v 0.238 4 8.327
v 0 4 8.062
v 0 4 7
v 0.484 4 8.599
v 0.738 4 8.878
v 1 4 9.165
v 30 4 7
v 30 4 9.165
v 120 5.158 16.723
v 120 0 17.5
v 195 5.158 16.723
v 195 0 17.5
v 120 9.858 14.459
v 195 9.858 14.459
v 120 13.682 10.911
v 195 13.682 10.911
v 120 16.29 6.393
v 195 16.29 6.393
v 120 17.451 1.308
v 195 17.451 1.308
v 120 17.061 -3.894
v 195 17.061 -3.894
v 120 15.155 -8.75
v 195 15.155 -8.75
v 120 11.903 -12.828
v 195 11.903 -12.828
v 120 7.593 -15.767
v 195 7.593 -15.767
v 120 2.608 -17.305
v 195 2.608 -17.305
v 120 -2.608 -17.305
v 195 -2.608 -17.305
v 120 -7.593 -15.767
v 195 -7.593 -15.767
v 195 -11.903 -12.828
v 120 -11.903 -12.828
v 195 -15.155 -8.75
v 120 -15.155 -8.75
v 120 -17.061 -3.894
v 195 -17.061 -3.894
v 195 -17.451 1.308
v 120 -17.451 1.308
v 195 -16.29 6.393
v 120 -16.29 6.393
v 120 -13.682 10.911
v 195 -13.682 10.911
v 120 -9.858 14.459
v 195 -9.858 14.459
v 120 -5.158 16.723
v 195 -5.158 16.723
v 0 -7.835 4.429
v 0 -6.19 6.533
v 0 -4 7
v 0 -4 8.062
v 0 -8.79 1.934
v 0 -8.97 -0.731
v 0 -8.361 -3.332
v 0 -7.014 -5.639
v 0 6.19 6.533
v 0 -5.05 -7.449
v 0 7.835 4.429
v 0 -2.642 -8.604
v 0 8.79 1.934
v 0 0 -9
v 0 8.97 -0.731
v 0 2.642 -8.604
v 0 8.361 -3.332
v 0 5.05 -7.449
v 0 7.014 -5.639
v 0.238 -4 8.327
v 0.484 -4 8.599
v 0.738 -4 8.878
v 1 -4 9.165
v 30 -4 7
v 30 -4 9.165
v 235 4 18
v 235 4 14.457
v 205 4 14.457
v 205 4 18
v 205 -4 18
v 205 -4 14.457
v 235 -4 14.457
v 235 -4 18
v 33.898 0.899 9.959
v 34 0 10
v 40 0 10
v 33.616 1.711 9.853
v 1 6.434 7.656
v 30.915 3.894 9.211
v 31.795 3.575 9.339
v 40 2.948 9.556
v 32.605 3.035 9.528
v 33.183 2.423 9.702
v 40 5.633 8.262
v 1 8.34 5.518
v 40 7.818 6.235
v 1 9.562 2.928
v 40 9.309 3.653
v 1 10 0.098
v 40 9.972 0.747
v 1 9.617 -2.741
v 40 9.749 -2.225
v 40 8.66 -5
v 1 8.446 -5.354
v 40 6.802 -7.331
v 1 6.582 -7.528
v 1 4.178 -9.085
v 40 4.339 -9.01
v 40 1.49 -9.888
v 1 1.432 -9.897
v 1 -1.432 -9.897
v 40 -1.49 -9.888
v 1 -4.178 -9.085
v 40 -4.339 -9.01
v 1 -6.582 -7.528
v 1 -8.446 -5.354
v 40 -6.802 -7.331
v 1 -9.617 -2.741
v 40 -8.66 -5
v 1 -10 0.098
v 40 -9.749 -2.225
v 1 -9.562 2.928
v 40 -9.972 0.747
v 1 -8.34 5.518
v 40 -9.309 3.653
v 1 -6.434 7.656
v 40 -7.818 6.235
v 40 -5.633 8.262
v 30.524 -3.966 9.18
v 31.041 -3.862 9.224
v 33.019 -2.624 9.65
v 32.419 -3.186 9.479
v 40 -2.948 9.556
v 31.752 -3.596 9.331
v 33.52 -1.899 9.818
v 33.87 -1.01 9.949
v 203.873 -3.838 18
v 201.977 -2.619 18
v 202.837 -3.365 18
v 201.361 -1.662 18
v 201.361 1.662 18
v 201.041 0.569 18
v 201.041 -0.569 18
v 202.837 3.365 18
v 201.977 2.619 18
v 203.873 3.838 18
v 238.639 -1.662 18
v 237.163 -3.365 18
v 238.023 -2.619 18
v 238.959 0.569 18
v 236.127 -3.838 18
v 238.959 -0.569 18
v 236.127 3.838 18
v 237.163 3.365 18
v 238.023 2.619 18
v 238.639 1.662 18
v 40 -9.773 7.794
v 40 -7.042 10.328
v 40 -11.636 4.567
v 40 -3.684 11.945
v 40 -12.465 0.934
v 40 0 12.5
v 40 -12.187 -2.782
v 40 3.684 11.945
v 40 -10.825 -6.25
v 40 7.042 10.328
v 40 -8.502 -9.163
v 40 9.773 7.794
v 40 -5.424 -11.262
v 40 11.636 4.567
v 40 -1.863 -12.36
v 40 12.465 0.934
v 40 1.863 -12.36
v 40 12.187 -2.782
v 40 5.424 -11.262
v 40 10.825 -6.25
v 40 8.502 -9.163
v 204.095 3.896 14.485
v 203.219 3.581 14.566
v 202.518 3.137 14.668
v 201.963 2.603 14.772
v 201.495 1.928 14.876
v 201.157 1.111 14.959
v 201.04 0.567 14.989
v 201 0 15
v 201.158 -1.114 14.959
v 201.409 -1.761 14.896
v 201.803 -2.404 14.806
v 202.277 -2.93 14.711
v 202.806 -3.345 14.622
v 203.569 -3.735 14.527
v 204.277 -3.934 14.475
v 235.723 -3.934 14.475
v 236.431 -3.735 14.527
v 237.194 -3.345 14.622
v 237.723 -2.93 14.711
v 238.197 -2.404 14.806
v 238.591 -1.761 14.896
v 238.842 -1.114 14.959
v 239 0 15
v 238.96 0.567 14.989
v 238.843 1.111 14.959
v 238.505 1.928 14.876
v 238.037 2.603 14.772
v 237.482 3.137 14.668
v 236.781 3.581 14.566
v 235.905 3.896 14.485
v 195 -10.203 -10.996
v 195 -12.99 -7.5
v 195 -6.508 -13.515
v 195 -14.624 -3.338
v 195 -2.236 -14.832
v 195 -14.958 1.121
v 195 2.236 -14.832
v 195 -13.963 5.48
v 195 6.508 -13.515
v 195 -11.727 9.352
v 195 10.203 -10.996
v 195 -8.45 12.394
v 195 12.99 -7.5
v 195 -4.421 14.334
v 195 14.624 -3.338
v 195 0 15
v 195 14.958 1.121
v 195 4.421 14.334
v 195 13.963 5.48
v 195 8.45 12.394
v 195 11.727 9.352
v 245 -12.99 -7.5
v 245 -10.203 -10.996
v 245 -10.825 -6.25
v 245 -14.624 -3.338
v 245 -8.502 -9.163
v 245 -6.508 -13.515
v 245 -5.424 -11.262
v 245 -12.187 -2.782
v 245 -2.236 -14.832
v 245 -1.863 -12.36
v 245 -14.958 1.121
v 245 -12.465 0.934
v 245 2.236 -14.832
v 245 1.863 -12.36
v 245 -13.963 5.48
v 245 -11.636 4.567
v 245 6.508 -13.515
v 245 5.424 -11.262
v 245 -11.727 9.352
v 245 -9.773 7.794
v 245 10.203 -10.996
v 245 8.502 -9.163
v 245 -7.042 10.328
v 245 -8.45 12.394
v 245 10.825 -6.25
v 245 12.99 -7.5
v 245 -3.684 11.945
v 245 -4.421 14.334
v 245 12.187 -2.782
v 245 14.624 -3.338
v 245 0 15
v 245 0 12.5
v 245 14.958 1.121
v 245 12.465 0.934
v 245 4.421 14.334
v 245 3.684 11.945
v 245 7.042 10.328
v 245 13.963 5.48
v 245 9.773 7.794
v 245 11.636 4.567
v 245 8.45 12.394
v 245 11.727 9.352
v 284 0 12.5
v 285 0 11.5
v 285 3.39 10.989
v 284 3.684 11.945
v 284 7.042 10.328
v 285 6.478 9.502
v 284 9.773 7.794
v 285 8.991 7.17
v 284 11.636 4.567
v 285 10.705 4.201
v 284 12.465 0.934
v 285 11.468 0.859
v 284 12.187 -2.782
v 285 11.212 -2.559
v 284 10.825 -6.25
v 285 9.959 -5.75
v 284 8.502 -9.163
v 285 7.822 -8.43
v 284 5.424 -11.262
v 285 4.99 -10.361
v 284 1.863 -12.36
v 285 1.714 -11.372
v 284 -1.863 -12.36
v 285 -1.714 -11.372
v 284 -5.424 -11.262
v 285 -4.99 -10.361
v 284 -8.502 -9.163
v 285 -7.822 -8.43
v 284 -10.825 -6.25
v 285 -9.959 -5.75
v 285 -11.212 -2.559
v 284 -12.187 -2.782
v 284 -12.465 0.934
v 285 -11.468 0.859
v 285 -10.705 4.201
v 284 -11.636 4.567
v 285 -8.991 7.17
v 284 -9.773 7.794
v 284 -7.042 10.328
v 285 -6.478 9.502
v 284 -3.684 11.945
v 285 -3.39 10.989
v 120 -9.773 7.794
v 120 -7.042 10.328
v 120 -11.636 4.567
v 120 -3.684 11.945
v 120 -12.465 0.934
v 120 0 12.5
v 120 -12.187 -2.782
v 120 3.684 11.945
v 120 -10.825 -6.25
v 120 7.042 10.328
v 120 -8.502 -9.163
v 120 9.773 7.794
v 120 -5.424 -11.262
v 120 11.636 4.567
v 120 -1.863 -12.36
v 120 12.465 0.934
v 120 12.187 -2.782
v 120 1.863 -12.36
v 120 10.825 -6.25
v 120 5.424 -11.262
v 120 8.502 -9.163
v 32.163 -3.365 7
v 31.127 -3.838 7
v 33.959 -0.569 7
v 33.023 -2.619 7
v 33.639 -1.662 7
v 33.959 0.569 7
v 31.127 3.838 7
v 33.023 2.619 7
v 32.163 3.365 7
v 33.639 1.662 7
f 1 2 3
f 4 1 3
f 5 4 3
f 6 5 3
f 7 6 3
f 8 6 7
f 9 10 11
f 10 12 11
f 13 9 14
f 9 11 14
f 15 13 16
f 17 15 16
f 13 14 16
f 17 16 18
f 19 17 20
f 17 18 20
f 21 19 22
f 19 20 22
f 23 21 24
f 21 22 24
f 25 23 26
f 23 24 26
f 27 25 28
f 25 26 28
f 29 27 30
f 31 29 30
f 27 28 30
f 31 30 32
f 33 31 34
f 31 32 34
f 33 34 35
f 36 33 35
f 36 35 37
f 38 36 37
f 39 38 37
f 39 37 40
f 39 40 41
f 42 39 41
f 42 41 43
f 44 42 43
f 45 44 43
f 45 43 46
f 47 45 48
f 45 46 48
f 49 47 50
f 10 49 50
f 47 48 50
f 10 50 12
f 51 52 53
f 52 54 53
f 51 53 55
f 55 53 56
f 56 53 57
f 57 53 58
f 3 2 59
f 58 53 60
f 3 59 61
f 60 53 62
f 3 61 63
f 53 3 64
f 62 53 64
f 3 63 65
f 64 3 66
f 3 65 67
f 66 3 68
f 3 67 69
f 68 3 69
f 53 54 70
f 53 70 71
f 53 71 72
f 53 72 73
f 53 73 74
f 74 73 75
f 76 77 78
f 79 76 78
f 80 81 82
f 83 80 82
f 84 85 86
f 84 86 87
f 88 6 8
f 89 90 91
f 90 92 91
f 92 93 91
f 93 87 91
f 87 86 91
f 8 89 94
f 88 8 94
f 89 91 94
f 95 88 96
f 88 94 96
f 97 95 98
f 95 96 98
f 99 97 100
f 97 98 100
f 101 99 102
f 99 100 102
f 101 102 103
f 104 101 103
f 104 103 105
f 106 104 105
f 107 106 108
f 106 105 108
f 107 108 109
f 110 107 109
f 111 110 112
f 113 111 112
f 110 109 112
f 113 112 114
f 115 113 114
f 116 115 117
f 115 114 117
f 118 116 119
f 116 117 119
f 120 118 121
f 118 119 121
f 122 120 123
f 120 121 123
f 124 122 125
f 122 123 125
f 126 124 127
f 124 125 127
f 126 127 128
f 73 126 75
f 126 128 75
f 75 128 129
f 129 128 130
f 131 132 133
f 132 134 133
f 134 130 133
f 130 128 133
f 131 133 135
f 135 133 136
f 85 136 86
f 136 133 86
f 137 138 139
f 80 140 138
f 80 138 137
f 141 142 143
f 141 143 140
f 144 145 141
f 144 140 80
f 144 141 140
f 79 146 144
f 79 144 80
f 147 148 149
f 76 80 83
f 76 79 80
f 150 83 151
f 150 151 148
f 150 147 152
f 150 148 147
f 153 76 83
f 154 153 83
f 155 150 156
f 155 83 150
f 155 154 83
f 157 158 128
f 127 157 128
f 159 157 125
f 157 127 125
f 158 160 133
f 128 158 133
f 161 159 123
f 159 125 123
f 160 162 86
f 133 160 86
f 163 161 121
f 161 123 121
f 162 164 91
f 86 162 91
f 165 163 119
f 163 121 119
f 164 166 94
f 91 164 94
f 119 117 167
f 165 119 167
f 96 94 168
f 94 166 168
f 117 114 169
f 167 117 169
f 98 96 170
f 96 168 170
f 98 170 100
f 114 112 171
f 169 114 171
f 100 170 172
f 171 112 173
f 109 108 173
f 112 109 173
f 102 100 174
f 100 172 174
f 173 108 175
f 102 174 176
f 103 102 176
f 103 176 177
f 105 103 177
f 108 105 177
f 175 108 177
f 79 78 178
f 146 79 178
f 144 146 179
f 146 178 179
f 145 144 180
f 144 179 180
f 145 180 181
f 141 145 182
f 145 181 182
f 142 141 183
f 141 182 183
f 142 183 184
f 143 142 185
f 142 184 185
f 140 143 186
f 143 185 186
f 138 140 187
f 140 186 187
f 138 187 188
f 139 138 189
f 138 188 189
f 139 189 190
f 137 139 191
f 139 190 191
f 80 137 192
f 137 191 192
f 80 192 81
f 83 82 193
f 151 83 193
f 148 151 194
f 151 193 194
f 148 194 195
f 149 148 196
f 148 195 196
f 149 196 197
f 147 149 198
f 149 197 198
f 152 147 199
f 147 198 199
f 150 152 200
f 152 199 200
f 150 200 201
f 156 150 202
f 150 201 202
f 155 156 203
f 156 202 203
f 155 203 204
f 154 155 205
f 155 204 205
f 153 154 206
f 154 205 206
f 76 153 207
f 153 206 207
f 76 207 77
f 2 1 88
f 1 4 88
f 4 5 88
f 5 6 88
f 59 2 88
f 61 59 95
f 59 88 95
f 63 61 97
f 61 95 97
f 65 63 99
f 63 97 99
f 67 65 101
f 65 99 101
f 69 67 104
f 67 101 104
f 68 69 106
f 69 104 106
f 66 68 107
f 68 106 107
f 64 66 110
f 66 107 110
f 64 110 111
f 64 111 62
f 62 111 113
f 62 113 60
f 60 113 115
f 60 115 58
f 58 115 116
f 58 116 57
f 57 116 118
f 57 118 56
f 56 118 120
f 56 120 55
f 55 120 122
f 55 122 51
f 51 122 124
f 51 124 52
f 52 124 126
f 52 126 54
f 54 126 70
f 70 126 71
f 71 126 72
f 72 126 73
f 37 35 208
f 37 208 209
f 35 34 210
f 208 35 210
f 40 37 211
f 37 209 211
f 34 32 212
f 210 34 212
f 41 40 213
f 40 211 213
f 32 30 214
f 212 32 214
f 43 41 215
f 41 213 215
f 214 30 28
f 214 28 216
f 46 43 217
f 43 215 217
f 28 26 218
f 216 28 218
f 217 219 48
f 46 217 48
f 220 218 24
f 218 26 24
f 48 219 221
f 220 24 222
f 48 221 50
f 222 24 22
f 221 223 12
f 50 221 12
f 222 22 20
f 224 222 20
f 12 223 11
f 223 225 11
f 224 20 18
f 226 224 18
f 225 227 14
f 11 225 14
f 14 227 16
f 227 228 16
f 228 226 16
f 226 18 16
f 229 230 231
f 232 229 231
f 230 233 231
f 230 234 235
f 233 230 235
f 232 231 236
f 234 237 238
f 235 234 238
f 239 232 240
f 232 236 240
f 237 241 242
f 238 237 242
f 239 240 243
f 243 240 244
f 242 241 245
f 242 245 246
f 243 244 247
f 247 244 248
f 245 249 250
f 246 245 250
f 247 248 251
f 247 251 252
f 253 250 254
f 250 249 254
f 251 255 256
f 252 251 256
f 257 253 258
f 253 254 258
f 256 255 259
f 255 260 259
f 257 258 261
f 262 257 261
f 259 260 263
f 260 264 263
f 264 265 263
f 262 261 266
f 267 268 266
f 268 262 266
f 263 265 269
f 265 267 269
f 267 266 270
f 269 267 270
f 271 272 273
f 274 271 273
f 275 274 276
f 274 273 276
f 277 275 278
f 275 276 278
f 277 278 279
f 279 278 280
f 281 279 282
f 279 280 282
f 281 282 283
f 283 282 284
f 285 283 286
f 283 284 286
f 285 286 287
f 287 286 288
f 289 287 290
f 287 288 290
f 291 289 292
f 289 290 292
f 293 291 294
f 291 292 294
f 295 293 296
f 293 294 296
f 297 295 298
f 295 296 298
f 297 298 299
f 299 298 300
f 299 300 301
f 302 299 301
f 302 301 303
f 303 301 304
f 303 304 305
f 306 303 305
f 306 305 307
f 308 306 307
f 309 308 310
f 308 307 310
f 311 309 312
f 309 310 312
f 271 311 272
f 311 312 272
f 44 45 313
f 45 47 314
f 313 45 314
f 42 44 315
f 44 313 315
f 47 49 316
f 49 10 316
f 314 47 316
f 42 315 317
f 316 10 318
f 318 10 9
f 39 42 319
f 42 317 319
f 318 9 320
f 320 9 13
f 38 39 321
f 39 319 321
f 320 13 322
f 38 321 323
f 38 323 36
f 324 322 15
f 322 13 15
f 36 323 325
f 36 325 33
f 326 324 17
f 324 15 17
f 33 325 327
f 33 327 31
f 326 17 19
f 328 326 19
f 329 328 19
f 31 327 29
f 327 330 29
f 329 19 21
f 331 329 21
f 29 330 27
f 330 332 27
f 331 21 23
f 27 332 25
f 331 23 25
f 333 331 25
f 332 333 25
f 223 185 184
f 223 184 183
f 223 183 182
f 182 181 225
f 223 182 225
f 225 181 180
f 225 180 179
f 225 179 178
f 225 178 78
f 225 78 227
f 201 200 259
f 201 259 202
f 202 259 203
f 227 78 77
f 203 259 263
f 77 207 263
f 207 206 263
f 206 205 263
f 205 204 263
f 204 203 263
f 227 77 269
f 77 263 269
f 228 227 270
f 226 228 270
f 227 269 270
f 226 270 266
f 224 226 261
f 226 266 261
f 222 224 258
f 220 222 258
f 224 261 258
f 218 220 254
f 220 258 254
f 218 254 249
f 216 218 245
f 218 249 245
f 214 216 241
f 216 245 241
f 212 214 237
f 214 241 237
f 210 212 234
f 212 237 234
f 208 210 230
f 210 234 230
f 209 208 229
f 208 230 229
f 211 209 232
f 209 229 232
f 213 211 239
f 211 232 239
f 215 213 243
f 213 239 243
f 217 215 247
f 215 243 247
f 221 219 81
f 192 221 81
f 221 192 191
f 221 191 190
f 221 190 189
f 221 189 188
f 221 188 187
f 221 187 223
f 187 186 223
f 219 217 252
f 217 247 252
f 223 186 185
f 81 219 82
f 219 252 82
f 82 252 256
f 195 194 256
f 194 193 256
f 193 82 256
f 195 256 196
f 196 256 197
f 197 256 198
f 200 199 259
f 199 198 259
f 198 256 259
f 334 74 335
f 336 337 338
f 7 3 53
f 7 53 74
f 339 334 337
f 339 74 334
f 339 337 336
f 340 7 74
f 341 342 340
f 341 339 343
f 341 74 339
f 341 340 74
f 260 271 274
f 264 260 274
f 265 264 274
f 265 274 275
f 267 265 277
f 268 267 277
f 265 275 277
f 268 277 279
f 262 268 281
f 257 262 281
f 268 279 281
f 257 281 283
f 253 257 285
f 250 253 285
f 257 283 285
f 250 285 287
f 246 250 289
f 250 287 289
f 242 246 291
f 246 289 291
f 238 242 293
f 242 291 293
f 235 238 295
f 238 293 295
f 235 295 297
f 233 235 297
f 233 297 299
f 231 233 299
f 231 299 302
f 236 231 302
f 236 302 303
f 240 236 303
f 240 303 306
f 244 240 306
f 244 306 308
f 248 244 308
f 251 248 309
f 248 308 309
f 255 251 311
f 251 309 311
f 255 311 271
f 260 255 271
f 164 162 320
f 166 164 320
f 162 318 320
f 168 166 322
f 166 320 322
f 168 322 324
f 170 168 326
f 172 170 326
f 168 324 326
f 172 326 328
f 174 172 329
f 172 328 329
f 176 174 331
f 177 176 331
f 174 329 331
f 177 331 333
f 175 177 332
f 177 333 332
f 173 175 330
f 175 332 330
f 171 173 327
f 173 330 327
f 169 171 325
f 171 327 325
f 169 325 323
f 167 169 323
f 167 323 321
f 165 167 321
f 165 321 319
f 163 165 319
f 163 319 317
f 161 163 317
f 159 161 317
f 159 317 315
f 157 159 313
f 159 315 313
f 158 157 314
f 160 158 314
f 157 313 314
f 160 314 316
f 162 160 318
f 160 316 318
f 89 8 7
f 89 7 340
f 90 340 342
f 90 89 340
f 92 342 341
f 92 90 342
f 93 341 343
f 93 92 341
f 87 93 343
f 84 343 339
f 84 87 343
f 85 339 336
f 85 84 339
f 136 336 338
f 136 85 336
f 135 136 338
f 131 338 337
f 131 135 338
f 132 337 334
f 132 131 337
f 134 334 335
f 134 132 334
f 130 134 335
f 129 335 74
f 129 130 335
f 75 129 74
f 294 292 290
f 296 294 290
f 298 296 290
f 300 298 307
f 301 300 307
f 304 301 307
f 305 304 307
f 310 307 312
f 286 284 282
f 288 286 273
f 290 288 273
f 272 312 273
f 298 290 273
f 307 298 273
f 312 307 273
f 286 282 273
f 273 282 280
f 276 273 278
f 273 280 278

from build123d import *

# Parameters (mm, degrees)
SKETCH2_W           = 30
SKETCH2_H           = 8
CUT_EXTRUDE2_DEPTH  = 3
SKETCH3_W           = 42.75
SKETCH3_H           = 8
CUT_EXTRUDE3_DEPTH  = 3
CHAMFER1_SIZE       = 1
BOSS_EXTRUDE1_DEPTH = 6


with BuildPart() as part:
    # Sketch1 → Revolve1 (revolve)
    with BuildSketch(Plane(origin=(0, 0, 0), x_dir=(1, 0, 0), z_dir=(0, 1, 0))):
        Polygon((0, 0), (0, -10), (40, -10), (40, -12.5), (120, -12.5), (120, -17.5), (195, -17.5), (195, -15), (245, -15), (245, -12.5), (285, -12.5), (285, 0), align=None)
    revolve(axis=Axis((285, 0, 0), (-1, 0, 0)))

    # Sketch2 → Cut-Extrude2 (cut)
    with BuildSketch(Plane(origin=(0, 0, 15), x_dir=(-1, 0, 0), z_dir=(0, 0, -1))):
        with Locations((-220, 0)):
            Rectangle(SKETCH2_W, SKETCH2_H)
        with BuildLine():
            Line((-235, -4), (-235, 4))
            ThreePointArc((-235, 4), (-239, 0), (-235, -4))
        make_face()
        with BuildLine():
            Line((-205, -4), (-205, 4))
            ThreePointArc((-205, 4), (-201, 0), (-205, -4))
        make_face()
    extrude(amount=CUT_EXTRUDE2_DEPTH, mode=Mode.SUBTRACT)

    # Sketch3 → Cut-Extrude3 (cut)
    with BuildSketch(Plane.XY.offset(10)):
        with Locations((8.625, 0)):
            Rectangle(SKETCH3_W, SKETCH3_H)
        with BuildLine():
            Line((30, -4), (30, 4))
            ThreePointArc((30, 4), (34, 0), (30, -4))
        make_face()
    extrude(amount=-CUT_EXTRUDE3_DEPTH, mode=Mode.SUBTRACT)

    # Chamfer1
    chamfer1_edges = [part.edges().sort_by_distance(p)[0] for p in [
        (0, 0, -10),
        (285, 0, -12.5),
    ]]
    chamfer(chamfer1_edges, length=CHAMFER1_SIZE)

    # Sketch9 → Boss-Extrude1 (add)
    with BuildSketch(Plane.XY.offset(12)):
        with BuildLine():
            Line((235, 4), (205, 4))
            ThreePointArc((205, 4), (201, 0), (205, -4))
            Line((205, -4), (235, -4))
            ThreePointArc((235, -4), (239, 0), (235, 4))
        make_face()
    extrude(amount=BOSS_EXTRUDE1_DEPTH)


solid = part.part
